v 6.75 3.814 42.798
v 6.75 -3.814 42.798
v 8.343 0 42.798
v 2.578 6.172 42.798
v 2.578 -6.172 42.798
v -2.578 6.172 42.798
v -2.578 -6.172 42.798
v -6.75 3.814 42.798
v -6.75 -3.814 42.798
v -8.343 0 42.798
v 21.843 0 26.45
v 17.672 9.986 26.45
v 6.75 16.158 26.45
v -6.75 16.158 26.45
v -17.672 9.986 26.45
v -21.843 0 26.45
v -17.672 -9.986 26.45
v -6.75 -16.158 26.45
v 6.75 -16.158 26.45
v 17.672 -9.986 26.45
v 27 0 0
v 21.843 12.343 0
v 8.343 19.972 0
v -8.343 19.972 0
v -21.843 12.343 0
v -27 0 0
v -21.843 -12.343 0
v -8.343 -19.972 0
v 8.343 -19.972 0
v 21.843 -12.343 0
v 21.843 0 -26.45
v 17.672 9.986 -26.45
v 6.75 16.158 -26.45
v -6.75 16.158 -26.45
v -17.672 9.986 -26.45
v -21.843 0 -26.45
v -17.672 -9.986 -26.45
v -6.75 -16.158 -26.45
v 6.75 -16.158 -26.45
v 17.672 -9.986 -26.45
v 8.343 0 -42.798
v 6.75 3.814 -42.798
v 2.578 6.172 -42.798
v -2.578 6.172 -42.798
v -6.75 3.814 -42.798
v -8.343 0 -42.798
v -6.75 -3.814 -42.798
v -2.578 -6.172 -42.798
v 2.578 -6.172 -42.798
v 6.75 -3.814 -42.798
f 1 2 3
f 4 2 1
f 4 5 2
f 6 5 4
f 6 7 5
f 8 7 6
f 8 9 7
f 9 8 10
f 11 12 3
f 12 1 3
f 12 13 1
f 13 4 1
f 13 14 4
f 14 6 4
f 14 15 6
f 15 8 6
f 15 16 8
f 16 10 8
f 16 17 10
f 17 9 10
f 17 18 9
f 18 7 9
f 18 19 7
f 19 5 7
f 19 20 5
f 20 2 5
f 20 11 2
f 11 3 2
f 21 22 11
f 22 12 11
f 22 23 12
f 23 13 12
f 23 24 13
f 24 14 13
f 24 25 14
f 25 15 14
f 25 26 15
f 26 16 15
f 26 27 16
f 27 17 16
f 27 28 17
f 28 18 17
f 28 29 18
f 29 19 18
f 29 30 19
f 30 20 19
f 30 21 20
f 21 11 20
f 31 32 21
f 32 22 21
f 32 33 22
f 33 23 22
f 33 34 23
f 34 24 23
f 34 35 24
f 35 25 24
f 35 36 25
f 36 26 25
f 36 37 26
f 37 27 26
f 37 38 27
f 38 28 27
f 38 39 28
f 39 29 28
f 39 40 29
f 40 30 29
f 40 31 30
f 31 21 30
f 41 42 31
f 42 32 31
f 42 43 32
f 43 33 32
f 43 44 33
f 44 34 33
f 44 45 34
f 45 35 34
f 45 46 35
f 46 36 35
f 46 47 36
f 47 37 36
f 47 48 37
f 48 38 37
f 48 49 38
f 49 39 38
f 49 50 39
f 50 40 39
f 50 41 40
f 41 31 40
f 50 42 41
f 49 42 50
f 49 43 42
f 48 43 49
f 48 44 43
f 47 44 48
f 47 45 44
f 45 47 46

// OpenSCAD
// Generated by SolidPython 1.0.1 on 2020-07-29 00:46:48


scale(v = [9, 7, 15]) {
	sphere(r = 3);
}
/***********************************************
*********      SolidPython code:      **********
************************************************
 
# import packages: SolidPython
from solid import *
from solid.utils import *
from itertools import chain, combinations, permutations


class Resize:

    def __init__(self, scad_file):
        self.scad_file = scad_file
        #self.scad_file = import_scad(scad_file)
        # cone/cylinder param:
        self.r1 = 0
        self.r2 = 0
        self.h = 0
        # rectangular prism param:
        self.w = 0
        self.l = 0
        # ellipse param:
        self.r = 0

    # import OpenScad code (file name corresponds to shape)


    # classify shape + parameters
    def assign(self, param1, param2, param3):
        if self.scad_file == 'cone.scad':
            self.r1 = param1
            self.r2 = param2
            self.h = param3
        elif self.scad_file == 'cylinder.scad':
            self.r1 = param1
            self.r2 = param2
            self.h = param3
        elif self.scad_file == 'rectangularPrism.scad':
            self.h = param1
            self.l = param2
            self.w = param3
        else:
            self.r = param1
            self.h = param2

    # resize parameters
    def iterate(self):
        x = range(3, 20, 2)
        i = 1
        if self.scad_file == 'cone.scad':
            tempList = list(permutations(x, 2))
            for temp in tempList:
                param1 = temp[0]
                param2 = temp[1]
                filepath = 'produced_scad_files/' + 'cone' + str(param1) + '_' + str(param2) + '_' + '.scad'
                scad_render_to_file(cylinder(h=param1, r1=param2, r2=0), filepath)

        elif self.scad_file == 'cylinder.scad':
            tempList = list(permutations(x, 3))
            for temp in tempList:
                param1 = temp[0]
                param2 = temp[1]
                filepath = 'produced_scad_files/' + 'cylinder' + str(param1) + '_' + str(param2) + '_' + '.scad'
                scad_render_to_file(cylinder(h=param1, r1=param2, r2=param2), filepath)

        elif self.scad_file == 'rectangularPrism.scad':
            tempList = list(permutations(x, 3))
            for temp in tempList:
                param1 = temp[0]
                param2 = temp[1]
                param3 = temp[2]
                filepath = 'produced_scad_files/' + 'rectangularPrism' + str(param1) + '_' + str(param2) + '_' + str(
                    param3) + '.scad'
                scad_render_to_file(cube(size=(param1, param2, param3)), filepath)

        elif self.scad_file == 'ellipse.scad':
            tempList = list(permutations(x, 4))
            for temp in tempList:
                param1 = temp[0]
                param2 = temp[1]
                param3 = temp[2]
                param4 = temp[3]
                filepath = 'produced_scad_files/' + 'ellipse' + str(param1) + '_' + str(param2) + '_' + str(param3) + '_' + str(param4) + '.scad'
                scad_render_to_file(scale([param1, param2, param3])(sphere(r=param4)), filepath)

    def render_to_scadfile(self):
        scad_render_to_file(scad, 'example.scad') 
 
************************************************/
